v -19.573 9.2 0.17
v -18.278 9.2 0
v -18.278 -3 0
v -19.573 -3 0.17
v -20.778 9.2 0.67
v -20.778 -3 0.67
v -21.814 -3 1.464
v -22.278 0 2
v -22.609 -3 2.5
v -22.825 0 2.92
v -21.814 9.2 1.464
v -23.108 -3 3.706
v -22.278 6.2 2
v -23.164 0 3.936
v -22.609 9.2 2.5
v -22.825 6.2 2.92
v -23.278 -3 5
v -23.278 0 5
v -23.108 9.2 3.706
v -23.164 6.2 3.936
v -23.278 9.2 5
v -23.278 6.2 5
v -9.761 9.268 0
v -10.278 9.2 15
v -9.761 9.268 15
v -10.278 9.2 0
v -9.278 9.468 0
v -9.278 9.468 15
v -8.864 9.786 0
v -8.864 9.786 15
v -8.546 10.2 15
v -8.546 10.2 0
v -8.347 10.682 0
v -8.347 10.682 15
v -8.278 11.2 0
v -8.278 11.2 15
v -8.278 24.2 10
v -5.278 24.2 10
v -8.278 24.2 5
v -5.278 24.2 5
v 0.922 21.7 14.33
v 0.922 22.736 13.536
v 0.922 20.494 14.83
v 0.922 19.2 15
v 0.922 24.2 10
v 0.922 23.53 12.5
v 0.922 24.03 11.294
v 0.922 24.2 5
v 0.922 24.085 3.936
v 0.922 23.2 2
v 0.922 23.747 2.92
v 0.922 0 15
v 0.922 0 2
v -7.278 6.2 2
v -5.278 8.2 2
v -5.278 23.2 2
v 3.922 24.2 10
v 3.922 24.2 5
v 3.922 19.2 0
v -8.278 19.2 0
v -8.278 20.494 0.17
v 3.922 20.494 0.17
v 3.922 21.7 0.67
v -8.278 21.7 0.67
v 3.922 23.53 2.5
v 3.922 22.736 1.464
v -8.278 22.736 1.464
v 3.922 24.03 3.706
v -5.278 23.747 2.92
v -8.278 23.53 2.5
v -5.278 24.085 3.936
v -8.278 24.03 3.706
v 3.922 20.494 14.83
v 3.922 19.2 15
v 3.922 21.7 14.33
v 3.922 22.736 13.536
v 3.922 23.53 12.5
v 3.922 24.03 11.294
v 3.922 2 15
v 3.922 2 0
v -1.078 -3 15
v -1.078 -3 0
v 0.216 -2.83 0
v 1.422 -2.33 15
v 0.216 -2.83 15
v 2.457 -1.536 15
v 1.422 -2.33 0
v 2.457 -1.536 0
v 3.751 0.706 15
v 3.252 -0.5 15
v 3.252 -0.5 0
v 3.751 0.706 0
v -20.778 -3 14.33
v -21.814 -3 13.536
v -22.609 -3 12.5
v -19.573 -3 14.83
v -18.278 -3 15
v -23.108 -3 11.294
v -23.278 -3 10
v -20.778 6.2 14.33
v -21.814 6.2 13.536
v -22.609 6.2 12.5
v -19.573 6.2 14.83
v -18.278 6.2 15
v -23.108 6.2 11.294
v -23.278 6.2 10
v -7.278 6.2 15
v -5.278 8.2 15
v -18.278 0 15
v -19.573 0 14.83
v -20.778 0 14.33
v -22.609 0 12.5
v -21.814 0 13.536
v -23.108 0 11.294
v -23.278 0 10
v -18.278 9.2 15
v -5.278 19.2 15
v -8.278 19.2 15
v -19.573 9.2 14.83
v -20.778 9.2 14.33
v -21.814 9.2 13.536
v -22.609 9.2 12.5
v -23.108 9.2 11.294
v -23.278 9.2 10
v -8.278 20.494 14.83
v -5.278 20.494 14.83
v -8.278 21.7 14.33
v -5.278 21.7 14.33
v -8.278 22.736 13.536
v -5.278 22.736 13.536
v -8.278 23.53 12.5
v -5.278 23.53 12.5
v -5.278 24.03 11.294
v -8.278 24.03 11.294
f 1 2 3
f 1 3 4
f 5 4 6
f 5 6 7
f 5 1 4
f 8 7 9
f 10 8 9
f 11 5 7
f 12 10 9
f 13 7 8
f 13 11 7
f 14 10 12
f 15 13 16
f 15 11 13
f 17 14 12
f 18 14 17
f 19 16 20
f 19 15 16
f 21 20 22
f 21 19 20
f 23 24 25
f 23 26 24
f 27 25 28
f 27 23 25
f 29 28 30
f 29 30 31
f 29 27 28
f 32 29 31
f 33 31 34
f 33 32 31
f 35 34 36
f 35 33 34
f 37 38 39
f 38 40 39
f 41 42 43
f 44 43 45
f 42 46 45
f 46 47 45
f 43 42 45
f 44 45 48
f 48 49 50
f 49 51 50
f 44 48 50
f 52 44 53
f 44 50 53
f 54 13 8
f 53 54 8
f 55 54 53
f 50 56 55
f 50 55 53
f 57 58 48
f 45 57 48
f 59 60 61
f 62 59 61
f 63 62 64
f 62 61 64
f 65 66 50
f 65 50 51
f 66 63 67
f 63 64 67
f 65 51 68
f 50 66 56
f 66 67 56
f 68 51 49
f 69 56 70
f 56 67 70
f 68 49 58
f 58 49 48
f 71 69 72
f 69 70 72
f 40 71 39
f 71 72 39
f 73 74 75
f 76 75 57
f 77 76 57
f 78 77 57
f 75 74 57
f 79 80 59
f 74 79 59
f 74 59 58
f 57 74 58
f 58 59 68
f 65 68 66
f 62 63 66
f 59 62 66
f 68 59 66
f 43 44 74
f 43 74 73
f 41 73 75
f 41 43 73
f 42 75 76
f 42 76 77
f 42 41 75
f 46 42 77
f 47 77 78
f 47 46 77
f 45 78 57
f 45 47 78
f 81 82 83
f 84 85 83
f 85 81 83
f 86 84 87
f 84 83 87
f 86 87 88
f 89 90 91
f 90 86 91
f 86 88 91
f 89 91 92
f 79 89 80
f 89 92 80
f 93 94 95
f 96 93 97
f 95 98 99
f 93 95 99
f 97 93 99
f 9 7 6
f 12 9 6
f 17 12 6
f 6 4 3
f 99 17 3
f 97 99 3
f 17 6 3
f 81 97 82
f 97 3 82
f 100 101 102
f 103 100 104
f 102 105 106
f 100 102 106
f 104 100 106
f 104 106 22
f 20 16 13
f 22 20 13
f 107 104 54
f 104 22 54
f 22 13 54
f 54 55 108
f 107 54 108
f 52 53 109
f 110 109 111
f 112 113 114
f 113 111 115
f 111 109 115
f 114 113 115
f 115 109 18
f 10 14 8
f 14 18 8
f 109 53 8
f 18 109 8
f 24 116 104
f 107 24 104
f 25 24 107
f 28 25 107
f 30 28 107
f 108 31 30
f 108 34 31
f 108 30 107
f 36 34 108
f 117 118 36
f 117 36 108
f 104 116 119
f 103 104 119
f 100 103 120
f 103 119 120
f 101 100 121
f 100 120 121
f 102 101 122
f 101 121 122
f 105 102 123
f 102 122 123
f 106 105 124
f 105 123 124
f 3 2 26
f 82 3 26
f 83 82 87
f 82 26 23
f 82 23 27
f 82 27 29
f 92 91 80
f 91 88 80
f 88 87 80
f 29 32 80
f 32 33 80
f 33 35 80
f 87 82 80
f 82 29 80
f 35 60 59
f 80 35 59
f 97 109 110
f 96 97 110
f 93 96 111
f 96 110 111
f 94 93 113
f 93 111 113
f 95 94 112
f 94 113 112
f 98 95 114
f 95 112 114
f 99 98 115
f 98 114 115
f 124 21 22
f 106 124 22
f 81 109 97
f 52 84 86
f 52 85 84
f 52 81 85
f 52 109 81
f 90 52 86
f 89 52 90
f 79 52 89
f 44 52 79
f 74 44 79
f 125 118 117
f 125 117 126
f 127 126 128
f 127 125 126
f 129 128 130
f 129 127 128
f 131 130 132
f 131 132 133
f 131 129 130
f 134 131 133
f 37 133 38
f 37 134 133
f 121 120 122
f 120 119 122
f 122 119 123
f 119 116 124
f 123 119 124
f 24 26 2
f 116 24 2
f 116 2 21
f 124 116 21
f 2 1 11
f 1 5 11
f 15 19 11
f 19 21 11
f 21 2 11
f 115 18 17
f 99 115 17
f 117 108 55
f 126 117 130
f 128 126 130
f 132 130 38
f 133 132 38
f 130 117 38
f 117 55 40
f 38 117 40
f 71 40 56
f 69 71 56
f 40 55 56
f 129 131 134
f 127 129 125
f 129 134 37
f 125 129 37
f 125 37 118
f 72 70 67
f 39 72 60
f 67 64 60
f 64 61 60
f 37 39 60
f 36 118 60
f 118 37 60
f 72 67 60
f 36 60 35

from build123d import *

# Parameters (mm, degrees)
F1_DEPTH     = 2
F2_DEPTH     = 15
F3_T1_DEPTH  = 28
F3_T3_DEPTH  = 28
F3_T5_DEPTH  = 28
F3_T7_DEPTH  = 28
F3_T9_DEPTH  = 37.2
F3_T11_DEPTH = 37.2
F3_T13_DEPTH = 40
F4_R         = 2
F5_SIZE      = 2


# Not quite as in the source:
# - a fillet or chamfer that OpenCascade refuses, or shapes differently, is made with other operations: its cross-section is extruded or revolved along the edge and cut away or added
# - a feature names something its author has since deleted; it is built from what else it names


with BuildPart() as f1:
    # F0 (on Top) → F1 (new body)
    with BuildSketch(Plane.XY):
        Polygon((0.9215265818, 0), (0.9215265818, 6.2), (0.9215265818, 24.2), (-5.2784734182, 24.2), (-5.2784734182, 6.2), (-23.2784734182, 6.2), (-23.2784734182, 0), (0, 0), align=None)
        Polygon((0.9215265818, 24.2), (0.9215265818, 6.2), (0.9215265818, 0), (0, 0), (-23.2784734182, 0), (-23.2784734182, -3), (0, -3), (3.9215265818, -3), (3.9215265818, 24.2), align=None)
        Polygon((-5.2784734182, 6.2), (-5.2784734182, 24.2), (-8.2784734182, 24.2), (-8.2784734182, 9.2), (-23.2784734182, 9.2), (-23.2784734182, 6.2), align=None)
    extrude(amount=F1_DEPTH)

    # F0 (on Top) → F2 (join)
    with BuildSketch(Plane.XY):
        Polygon((-5.2784734182, 6.2), (-5.2784734182, 24.2), (-8.2784734182, 24.2), (-8.2784734182, 9.2), (-23.2784734182, 9.2), (-23.2784734182, 6.2), align=None)
        Polygon((0.9215265818, 24.2), (0.9215265818, 6.2), (0.9215265818, 0), (0, 0), (-23.2784734182, 0), (-23.2784734182, -3), (0, -3), (3.9215265818, -3), (3.9215265818, 24.2), align=None)
    extrude(amount=F2_DEPTH)

    # F3: fillet of radius 5 on 7 edges, made by hand

    # F3_s2 → F3_t1 (cut)
    with BuildSketch(Plane.XZ.offset(-12.5)):
        with BuildLine():
            ThreePointArc((-18.2784734182, 15), (-21.8140073241, 13.5355339059), (-23.2784734182, 10))
            Line((-23.2784734182, 10), (-23.2784734182, 15))
            Line((-23.2784734182, 15), (-18.2784734182, 15))
        make_face()
    extrude(amount=F3_T1_DEPTH, mode=Mode.SUBTRACT)

    # F3_s4 → F3_t3 (cut)
    with BuildSketch(Plane.XZ.offset(-21.7)):
        with BuildLine():
            ThreePointArc((-18.2784734182, 15), (-21.8140073241, 13.5355339059), (-23.2784734182, 10))
            Line((-23.2784734182, 10), (-23.2784734182, 15))
            Line((-23.2784734182, 15), (-18.2784734182, 15))
        make_face()
    extrude(amount=F3_T3_DEPTH, mode=Mode.SUBTRACT)

    # F3_s6 → F3_t5 (cut)
    with BuildSketch(Plane.YZ.offset(-20.7784734182)):
        with BuildLine():
            ThreePointArc((19.2, 15), (22.7355339059, 13.5355339059), (24.2, 10))
            Line((24.2, 10), (24.2, 15))
            Line((24.2, 15), (19.2, 15))
        make_face()
    extrude(amount=F3_T5_DEPTH, mode=Mode.SUBTRACT)

    # F3_s8 → F3_t7 (cut)
    with BuildSketch(Plane.YZ.offset(-11.5784734182)):
        with BuildLine():
            ThreePointArc((24.2, 10), (22.7355339059, 13.5355339059), (19.2, 15))
            Line((19.2, 15), (24.2, 15))
            Line((24.2, 15), (24.2, 10))
        make_face()
    extrude(amount=F3_T7_DEPTH, mode=Mode.SUBTRACT)

    # F3_s10 → F3_t9 (cut)
    with BuildSketch(Plane.XZ.offset(-21.7)):
        with BuildLine():
            ThreePointArc((-18.2784734182, 0), (-21.8140073241, 1.4644660941), (-23.2784734182, 5))
            Line((-23.2784734182, 5), (-23.2784734182, 0))
            Line((-23.2784734182, 0), (-18.2784734182, 0))
        make_face()
    extrude(amount=F3_T9_DEPTH, mode=Mode.SUBTRACT)

    # F3_s12 → F3_t11 (cut)
    with BuildSketch(Plane.YZ.offset(-20.7784734182)):
        with BuildLine():
            ThreePointArc((19.2, 0), (22.7355339059, 1.4644660941), (24.2, 5))
            Line((24.2, 5), (24.2, 0))
            Line((24.2, 0), (19.2, 0))
        make_face()
    extrude(amount=F3_T11_DEPTH, mode=Mode.SUBTRACT)

    # F3_s14 → F3_t13 (cut)
    with BuildSketch(Plane.XY.offset(-12.5)):
        with BuildLine():
            ThreePointArc((-1.0784734182, -3), (2.4570604877, -1.5355339059), (3.9215265818, 2))
            Line((3.9215265818, 2), (3.9215265818, -3))
            Line((3.9215265818, -3), (-1.0784734182, -3))
        make_face()
    extrude(amount=F3_T13_DEPTH, mode=Mode.SUBTRACT)

    # F4
    f4_edges = [f1.edges().sort_by_distance(p)[0] for p in [
        (-8.278473, 9.2, 7.5),
    ]]
    fillet(f4_edges, radius=F4_R)

    # F5
    f5_edges = [f1.edges().sort_by_distance(p)[0] for p in [
        (-5.278473, 6.2, 8.5),
    ]]
    chamfer(f5_edges, length=F5_SIZE)


solid = f1.part
